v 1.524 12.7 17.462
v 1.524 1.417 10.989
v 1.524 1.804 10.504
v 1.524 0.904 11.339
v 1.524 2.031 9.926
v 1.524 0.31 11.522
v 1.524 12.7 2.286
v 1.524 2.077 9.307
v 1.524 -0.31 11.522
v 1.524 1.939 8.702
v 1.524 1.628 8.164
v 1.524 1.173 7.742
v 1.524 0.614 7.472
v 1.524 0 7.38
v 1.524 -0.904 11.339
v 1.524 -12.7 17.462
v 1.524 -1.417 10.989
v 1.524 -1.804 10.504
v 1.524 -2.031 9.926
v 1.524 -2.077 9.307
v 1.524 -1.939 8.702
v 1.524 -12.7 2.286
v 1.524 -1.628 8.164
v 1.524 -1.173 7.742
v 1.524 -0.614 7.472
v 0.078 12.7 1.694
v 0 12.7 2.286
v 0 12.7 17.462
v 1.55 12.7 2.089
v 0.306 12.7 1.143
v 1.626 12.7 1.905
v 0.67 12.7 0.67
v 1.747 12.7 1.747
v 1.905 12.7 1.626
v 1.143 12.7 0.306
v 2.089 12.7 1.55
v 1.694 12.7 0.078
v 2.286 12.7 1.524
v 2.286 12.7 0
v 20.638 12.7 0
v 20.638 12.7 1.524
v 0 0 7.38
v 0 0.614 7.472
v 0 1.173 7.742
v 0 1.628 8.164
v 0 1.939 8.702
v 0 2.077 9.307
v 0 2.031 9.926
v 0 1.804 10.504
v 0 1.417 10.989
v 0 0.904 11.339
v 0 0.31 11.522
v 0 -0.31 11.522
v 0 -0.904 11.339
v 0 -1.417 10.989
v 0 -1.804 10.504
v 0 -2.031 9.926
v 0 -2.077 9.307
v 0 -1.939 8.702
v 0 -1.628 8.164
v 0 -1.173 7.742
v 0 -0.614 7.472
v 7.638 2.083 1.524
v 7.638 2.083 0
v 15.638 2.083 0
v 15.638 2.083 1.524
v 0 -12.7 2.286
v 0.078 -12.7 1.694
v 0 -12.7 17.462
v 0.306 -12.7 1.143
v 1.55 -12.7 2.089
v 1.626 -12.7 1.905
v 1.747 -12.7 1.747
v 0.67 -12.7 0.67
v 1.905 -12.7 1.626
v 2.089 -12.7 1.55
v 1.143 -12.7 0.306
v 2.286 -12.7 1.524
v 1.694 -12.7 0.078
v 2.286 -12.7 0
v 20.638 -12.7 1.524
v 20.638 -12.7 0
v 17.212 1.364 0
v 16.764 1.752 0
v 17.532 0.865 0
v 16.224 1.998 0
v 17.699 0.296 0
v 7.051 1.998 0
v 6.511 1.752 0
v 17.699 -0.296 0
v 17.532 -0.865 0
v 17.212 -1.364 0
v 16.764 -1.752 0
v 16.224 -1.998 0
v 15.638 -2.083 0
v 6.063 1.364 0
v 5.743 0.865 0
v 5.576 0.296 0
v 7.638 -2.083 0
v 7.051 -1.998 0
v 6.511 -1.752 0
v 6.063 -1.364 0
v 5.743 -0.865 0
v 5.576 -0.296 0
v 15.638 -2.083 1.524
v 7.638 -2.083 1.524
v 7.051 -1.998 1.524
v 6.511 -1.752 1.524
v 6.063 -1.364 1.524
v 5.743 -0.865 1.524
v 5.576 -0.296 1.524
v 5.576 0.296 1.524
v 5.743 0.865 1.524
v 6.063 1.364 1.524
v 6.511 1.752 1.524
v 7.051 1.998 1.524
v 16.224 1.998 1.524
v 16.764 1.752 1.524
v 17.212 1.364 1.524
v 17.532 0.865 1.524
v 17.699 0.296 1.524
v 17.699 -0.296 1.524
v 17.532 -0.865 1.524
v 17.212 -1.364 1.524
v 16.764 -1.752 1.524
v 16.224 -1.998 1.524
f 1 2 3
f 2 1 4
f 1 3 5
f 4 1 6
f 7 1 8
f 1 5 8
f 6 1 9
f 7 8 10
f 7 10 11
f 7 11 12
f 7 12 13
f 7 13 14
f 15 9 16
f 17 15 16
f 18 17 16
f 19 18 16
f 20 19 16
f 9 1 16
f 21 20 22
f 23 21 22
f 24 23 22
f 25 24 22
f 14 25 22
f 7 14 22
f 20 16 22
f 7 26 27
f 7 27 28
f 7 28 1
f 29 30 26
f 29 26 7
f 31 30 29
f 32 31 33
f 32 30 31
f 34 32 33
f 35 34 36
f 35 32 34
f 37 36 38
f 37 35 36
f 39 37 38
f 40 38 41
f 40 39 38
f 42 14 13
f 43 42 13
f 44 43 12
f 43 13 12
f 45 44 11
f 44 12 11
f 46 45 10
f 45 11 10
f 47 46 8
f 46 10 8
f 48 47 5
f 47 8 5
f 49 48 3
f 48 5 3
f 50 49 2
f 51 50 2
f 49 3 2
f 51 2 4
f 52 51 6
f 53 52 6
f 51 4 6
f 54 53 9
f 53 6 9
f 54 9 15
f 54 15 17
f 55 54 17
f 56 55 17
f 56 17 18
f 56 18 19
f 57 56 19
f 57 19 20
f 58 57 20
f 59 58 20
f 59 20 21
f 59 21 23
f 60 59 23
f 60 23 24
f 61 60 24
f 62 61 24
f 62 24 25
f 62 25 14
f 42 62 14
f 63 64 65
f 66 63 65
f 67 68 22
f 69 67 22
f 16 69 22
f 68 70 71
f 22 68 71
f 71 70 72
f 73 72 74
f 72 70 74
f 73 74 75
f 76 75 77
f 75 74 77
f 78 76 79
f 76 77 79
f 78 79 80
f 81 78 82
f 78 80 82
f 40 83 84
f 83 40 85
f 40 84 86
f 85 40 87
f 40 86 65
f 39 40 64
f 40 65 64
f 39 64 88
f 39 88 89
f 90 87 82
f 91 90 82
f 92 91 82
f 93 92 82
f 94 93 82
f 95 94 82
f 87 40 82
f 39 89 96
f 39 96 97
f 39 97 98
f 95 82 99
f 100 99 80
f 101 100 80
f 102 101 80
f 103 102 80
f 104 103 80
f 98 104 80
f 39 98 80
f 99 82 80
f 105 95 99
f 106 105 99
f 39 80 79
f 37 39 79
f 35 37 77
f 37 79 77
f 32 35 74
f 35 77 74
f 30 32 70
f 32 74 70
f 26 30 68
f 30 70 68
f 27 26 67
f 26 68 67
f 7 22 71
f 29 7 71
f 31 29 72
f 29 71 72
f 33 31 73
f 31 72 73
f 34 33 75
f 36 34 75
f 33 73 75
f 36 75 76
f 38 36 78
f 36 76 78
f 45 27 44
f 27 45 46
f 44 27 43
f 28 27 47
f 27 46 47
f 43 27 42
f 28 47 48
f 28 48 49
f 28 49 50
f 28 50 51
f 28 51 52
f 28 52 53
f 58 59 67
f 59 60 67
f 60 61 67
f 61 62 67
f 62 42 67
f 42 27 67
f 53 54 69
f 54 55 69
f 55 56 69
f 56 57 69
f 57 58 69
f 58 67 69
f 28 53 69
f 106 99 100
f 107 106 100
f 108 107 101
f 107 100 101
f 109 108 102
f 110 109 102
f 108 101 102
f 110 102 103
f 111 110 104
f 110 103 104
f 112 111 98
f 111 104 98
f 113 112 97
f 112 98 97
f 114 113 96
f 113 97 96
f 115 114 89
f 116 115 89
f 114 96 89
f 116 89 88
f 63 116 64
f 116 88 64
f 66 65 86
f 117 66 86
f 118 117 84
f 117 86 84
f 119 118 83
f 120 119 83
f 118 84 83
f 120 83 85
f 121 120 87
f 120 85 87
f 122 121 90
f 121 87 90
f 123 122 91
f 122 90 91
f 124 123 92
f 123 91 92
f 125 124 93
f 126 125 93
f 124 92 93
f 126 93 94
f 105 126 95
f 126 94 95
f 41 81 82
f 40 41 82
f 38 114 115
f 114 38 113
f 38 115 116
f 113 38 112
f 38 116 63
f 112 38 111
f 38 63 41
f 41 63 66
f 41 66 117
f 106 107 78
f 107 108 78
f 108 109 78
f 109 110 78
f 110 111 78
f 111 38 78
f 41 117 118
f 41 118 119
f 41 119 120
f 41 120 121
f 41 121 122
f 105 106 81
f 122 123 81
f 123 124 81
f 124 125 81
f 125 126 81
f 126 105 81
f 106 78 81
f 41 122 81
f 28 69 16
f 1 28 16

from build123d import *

# Parameters (mm, degrees)
EXTRUDE_THIN1_START = -12.7
EXTRUDE_THIN1_DEPTH = 25.4
SKETCH4_R           = 2.0828
EXTRUDE3_DEPTH      = 29.836691705
CUT_EXTRUDE1_DEPTH  = 30.868634259


# Read off the part's stored shape, not the designer's step: Extrude-Thin1
with BuildPart() as part:
    # Extrude-Thin1 outline → Extrude-Thin1 (new body)
    with BuildSketch(Plane(origin=(0, 0, 0), x_dir=(1, 0, 0), z_dir=(0, 1, 0)).offset(EXTRUDE_THIN1_START)):
        with BuildLine():
            Line((2.286, -1.524), (20.6375, -1.524))
            Line((20.6375, -1.524), (20.6375, 0))
            Line((20.6375, 0), (2.286, 0))
            ThreePointArc((2.286, 0), (0.669553898, -0.669553898), (0, -2.286))
            Line((0, -2.286), (0, -17.4625))
            Line((0, -17.4625), (1.524, -17.4625))
            Line((1.524, -17.4625), (1.524, -2.286))
            ThreePointArc((1.524, -2.286), (1.747184633, -1.747184633), (2.286, -1.524))
        make_face()
    extrude(amount=EXTRUDE_THIN1_DEPTH)

    # Sketch4 → Extrude3 (cut, through all)
    with BuildSketch(Plane(origin=(1.524, 0, 0), x_dir=(0, 0, -1), z_dir=(1, 0, 0))):
        with Locations((-9.4625, 0)):
            Circle(SKETCH4_R)
    extrude(amount=-EXTRUDE3_DEPTH, mode=Mode.SUBTRACT)

    # Sketch6 → Cut-Extrude1 (cut, through all)
    with BuildSketch(Plane.XY):
        with BuildLine():
            Line((7.6375, 2.0828), (15.6375, 2.0828))
            ThreePointArc((15.6375, 2.0828), (17.7203, 0), (15.6375, -2.0828))
            Line((15.6375, -2.0828), (7.6375, -2.0828))
            ThreePointArc((7.6375, -2.0828), (5.5547, 0), (7.6375, 2.0828))
        make_face()
    extrude(amount=CUT_EXTRUDE1_DEPTH, mode=Mode.SUBTRACT)


solid = part.part
